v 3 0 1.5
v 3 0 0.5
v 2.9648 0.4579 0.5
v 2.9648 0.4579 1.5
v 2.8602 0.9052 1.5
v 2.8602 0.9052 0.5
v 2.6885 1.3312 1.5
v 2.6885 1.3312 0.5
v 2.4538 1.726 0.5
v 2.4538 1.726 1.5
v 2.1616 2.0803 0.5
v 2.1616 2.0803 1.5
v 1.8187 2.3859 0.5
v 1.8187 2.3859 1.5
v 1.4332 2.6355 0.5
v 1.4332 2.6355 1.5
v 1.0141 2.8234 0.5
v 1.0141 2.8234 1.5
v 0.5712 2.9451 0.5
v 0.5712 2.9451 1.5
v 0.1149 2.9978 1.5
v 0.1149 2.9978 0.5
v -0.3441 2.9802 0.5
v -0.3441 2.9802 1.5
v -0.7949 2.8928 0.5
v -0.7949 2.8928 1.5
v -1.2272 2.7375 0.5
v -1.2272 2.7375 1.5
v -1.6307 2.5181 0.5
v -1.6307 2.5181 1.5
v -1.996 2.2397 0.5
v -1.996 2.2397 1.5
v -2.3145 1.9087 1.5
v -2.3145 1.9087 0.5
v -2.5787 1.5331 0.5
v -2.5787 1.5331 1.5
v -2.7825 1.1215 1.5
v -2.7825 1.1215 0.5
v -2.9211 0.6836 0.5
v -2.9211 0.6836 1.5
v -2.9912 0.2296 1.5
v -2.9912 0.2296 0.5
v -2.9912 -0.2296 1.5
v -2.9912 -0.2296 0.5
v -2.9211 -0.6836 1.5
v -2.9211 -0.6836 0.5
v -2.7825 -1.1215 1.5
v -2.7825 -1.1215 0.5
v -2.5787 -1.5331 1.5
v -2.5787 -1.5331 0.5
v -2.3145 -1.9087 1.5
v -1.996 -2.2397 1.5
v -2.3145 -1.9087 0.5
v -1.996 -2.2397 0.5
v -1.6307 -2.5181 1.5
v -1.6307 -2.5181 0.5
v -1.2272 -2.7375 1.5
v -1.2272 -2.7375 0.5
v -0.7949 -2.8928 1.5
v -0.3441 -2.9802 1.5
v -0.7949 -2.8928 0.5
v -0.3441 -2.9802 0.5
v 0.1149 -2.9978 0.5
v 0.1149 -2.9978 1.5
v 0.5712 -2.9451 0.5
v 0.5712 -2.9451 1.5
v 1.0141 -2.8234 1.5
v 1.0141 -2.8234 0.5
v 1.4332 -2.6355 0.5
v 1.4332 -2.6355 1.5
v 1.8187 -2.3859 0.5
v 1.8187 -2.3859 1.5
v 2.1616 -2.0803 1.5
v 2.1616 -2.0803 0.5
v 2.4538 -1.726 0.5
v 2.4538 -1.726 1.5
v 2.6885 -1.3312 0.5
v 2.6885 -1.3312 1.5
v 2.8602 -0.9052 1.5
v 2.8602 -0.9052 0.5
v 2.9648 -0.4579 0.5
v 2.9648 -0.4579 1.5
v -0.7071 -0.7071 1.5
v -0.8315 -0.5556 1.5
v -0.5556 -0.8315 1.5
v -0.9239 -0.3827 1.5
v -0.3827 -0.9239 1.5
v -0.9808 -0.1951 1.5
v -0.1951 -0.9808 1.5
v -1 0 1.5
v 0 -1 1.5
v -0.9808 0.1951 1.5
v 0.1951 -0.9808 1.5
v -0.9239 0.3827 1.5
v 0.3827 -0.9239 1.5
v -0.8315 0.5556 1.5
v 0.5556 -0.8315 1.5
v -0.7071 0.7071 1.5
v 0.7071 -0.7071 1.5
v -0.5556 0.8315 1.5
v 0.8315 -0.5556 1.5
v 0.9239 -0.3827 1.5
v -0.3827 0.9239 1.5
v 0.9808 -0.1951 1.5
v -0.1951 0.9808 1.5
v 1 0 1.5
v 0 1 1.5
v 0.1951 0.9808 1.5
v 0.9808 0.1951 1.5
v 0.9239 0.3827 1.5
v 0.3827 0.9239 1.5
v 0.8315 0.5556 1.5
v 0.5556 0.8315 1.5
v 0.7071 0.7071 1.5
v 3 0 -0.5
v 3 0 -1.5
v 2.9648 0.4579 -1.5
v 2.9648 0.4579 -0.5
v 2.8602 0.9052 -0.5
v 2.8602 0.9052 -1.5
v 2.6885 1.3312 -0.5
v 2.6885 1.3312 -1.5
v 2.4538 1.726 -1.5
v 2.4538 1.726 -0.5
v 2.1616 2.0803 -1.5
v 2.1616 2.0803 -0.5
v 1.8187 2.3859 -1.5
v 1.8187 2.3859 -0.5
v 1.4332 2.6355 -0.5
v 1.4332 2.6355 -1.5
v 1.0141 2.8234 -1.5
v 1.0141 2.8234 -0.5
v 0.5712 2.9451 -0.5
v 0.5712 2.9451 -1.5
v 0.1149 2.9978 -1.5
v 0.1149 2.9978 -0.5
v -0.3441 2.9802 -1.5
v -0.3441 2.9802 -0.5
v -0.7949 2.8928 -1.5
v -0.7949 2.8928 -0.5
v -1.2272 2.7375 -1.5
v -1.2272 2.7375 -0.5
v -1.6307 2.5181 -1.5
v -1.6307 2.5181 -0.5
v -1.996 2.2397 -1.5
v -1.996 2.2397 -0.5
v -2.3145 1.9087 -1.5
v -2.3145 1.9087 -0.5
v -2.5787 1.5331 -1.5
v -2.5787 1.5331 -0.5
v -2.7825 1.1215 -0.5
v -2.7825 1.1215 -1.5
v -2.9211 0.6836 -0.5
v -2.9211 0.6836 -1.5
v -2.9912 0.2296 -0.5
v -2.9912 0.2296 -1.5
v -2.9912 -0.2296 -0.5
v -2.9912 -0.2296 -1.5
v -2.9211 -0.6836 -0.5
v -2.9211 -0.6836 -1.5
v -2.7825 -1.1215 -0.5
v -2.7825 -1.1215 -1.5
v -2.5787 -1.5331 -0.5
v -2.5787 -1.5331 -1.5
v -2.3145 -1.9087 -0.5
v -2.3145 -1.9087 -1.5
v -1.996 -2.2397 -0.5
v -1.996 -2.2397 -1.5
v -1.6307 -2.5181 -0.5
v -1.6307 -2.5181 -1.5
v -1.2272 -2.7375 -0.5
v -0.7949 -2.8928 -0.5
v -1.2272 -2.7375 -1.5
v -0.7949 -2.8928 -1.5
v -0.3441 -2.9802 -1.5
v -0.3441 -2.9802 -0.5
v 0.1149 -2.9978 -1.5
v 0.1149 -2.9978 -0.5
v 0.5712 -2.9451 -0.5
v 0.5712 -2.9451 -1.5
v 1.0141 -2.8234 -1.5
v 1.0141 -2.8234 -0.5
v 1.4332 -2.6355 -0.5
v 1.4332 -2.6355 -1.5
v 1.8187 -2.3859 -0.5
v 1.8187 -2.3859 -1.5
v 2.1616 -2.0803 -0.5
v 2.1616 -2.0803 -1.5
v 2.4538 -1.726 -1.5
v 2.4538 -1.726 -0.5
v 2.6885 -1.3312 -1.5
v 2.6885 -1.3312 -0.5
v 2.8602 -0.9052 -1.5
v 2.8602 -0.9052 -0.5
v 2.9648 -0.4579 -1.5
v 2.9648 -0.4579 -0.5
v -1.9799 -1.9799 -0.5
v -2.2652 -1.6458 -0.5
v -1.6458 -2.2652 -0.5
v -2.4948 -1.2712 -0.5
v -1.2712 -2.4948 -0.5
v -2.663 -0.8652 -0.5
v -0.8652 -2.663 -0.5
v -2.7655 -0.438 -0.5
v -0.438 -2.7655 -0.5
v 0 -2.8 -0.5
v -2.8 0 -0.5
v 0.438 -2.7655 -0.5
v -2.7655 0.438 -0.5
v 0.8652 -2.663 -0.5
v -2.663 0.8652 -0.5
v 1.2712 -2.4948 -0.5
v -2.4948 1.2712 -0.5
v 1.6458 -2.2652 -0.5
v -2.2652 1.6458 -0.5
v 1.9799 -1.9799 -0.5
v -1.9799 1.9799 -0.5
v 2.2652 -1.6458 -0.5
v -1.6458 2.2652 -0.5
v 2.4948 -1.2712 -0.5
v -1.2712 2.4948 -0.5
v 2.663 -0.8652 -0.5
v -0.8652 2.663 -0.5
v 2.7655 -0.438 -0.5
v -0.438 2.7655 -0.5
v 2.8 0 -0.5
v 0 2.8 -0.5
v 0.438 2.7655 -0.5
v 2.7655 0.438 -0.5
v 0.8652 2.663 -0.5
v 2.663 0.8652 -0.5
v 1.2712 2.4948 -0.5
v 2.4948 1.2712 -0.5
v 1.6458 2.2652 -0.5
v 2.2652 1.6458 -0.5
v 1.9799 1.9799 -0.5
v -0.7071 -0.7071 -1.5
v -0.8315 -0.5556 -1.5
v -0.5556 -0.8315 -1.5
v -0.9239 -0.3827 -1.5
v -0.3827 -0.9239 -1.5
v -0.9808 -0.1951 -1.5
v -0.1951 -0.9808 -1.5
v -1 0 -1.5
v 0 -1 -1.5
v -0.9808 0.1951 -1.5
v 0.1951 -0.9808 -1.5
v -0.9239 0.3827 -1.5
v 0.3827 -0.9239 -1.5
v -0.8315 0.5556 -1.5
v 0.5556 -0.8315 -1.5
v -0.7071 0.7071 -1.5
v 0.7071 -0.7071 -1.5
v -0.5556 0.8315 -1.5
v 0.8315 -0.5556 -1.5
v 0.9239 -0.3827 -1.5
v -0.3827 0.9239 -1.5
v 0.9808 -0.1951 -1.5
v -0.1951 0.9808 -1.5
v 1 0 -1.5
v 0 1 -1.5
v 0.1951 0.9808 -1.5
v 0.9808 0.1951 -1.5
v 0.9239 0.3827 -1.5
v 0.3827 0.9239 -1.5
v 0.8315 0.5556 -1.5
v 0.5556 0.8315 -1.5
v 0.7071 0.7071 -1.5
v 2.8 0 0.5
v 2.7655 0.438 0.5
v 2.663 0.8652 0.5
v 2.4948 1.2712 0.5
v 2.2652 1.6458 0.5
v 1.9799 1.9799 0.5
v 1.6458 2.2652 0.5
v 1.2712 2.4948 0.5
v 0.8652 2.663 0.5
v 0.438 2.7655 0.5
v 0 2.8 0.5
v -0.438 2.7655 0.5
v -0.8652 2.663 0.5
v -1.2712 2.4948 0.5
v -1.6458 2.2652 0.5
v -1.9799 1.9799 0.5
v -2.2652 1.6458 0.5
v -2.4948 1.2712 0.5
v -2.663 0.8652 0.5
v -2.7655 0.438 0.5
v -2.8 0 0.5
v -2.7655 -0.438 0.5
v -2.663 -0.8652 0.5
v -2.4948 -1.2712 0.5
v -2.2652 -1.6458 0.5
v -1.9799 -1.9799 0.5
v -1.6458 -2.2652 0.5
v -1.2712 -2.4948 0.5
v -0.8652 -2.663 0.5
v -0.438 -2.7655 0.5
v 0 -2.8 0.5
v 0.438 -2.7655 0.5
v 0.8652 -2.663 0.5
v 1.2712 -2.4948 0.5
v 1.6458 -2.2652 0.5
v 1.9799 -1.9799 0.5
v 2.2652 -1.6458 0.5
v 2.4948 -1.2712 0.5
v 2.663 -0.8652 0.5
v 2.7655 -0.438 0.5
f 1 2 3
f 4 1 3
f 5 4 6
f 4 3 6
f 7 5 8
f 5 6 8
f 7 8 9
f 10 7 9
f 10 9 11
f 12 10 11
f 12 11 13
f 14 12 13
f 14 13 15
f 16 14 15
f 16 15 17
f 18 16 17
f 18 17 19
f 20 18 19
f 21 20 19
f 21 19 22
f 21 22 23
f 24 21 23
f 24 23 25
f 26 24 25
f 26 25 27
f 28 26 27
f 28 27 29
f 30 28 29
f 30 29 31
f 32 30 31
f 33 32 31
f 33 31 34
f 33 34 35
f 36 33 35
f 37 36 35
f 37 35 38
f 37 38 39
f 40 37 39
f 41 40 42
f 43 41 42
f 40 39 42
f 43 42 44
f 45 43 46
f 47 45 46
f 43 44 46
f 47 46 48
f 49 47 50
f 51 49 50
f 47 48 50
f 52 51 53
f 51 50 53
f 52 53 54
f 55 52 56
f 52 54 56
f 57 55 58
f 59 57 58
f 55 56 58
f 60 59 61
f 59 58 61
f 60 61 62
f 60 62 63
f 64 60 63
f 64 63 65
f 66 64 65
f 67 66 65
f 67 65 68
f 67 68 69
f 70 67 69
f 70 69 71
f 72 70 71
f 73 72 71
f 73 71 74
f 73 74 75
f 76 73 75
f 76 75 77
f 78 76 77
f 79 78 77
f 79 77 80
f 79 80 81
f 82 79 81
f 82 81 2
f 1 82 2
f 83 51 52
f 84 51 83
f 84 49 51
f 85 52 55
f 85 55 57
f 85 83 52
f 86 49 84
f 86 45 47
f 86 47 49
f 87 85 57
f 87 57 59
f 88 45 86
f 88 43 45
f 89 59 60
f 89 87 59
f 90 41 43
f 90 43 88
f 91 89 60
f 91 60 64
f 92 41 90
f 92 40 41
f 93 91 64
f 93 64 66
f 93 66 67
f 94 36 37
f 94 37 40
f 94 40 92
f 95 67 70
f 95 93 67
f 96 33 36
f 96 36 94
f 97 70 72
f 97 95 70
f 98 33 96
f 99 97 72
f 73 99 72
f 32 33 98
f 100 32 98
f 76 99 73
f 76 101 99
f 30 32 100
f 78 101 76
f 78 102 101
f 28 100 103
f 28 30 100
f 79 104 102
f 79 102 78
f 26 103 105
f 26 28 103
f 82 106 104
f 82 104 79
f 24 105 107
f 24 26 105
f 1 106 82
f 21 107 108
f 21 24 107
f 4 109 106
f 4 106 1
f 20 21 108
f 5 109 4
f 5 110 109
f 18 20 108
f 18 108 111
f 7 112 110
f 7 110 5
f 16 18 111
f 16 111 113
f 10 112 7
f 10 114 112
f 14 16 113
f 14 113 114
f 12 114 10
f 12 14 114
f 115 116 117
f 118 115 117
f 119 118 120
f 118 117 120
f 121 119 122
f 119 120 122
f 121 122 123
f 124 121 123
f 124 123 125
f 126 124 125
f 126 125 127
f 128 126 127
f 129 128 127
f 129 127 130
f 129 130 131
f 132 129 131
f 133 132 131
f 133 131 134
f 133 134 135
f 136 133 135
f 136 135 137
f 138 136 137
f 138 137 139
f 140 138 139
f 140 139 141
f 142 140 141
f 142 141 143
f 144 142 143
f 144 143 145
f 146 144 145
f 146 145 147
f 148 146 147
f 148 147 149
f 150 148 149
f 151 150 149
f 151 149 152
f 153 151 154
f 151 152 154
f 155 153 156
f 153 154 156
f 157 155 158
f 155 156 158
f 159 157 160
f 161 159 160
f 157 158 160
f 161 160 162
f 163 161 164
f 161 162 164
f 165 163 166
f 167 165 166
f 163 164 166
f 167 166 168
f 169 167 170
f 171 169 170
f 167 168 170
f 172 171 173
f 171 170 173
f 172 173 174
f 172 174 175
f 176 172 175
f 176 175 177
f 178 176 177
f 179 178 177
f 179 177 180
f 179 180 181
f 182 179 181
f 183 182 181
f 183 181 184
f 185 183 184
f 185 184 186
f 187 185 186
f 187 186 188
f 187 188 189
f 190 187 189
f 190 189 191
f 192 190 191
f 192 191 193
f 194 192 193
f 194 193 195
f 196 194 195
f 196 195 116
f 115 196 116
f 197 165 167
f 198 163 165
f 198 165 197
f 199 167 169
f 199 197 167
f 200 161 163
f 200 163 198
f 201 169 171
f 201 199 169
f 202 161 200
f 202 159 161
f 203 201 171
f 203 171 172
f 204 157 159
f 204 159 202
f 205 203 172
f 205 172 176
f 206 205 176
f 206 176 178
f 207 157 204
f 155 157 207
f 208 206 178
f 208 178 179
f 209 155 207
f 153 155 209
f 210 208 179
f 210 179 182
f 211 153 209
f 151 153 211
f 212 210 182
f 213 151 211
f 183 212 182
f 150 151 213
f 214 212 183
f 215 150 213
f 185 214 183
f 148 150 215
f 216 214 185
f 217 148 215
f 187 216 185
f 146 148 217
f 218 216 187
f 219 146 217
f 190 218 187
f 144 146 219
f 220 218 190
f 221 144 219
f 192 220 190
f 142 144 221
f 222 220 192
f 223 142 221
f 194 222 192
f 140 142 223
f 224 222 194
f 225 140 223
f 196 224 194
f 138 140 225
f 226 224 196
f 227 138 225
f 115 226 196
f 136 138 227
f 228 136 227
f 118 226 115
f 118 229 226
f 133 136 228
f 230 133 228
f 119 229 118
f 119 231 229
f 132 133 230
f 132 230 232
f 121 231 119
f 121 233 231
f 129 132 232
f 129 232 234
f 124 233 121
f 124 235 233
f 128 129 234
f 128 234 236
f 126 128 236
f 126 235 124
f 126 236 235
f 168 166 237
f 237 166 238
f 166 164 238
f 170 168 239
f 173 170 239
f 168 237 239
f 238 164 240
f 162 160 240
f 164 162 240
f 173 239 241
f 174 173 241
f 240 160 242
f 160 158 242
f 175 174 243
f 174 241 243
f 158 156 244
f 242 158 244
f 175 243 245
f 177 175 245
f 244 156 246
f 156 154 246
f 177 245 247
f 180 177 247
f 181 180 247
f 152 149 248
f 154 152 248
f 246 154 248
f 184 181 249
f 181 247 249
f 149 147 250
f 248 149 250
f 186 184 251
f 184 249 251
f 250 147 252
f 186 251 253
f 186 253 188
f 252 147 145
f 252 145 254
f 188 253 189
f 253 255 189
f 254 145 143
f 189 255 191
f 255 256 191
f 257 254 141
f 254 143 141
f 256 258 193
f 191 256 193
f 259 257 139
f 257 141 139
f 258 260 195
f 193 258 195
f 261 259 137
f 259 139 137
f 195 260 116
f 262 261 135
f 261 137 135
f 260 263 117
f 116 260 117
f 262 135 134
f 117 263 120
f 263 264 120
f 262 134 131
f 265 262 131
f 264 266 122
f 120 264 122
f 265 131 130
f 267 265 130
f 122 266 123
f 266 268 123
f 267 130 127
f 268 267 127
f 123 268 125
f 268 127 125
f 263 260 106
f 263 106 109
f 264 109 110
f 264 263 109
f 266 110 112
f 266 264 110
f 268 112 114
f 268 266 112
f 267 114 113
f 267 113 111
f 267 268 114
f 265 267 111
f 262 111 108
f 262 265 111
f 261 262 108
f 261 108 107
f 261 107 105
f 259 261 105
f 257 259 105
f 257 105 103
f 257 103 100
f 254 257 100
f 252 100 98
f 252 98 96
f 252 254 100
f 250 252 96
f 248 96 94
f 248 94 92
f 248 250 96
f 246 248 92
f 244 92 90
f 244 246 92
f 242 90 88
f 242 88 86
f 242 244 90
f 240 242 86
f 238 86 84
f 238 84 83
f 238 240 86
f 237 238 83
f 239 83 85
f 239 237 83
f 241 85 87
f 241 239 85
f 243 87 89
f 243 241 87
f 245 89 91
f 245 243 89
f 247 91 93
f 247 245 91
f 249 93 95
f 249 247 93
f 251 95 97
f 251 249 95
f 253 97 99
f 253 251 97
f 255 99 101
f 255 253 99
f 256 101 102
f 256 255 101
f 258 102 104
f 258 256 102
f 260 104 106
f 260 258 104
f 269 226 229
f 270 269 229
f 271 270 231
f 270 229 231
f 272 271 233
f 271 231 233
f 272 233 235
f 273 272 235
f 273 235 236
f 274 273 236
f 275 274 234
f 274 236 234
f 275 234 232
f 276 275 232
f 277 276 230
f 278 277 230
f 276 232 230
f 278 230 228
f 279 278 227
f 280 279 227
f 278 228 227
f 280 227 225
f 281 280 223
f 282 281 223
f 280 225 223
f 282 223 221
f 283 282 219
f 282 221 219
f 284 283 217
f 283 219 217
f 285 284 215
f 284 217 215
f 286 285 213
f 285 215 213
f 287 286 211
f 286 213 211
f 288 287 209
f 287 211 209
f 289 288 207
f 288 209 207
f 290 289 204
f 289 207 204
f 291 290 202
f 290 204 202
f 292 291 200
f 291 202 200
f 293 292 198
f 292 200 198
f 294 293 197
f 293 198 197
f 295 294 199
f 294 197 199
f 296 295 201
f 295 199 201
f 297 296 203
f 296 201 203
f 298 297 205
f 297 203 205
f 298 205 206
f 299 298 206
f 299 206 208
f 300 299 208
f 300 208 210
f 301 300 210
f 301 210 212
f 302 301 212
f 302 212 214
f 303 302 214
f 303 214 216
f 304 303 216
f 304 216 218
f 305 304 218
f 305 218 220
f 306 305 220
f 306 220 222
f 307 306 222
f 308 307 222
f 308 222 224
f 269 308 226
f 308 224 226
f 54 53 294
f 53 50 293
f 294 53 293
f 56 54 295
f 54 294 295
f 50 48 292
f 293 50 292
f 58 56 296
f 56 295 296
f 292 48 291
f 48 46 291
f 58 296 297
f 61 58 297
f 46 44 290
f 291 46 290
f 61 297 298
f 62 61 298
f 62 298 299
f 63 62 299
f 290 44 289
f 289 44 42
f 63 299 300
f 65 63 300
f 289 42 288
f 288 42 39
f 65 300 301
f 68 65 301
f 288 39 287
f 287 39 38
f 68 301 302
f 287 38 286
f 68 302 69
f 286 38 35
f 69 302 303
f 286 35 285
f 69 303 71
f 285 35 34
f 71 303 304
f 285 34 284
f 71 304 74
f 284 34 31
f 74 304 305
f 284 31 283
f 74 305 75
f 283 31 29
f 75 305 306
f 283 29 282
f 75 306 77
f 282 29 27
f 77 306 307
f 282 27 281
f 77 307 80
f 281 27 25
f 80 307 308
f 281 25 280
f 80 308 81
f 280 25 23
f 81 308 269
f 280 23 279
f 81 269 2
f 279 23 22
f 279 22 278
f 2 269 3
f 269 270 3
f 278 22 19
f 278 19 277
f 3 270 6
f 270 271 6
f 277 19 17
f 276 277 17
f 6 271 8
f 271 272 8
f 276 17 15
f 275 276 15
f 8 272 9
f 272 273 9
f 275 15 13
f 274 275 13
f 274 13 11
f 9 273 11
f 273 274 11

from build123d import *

# Parameters (mm, degrees)
EXTRUDE_1_DEPTH          = 1.5
EXTRUDE_1_DEPTH_BACK     = 1.5
SKETCH_1_R               = 3
SKETCH_1_R_2             = 1
CUT_EXTRUDE_1_DEPTH      = 0.5
CUT_EXTRUDE_1_DEPTH_BACK = 0.5
SKETCH_2_R               = 3
SKETCH_2_R_2             = 2.8


with BuildPart() as part:
    # 草图1 → 凸台-拉伸1 (new, two sides: drawn at the far end of the back side and taken through both)
    with BuildSketch(Plane.XY.offset(-EXTRUDE_1_DEPTH_BACK)):
        Circle(SKETCH_1_R)
        Circle(SKETCH_1_R_2, mode=Mode.SUBTRACT)
    extrude(amount=EXTRUDE_1_DEPTH + EXTRUDE_1_DEPTH_BACK)

    # 草图2 → 切除-拉伸1 (cut, two sides: drawn at the far end of the back side and taken through both)
    with BuildSketch(Plane.XY.offset(-CUT_EXTRUDE_1_DEPTH_BACK)):
        Circle(SKETCH_2_R)
        Circle(SKETCH_2_R_2, mode=Mode.SUBTRACT)
    extrude(amount=CUT_EXTRUDE_1_DEPTH + CUT_EXTRUDE_1_DEPTH_BACK, mode=Mode.SUBTRACT)


solid = part.part
